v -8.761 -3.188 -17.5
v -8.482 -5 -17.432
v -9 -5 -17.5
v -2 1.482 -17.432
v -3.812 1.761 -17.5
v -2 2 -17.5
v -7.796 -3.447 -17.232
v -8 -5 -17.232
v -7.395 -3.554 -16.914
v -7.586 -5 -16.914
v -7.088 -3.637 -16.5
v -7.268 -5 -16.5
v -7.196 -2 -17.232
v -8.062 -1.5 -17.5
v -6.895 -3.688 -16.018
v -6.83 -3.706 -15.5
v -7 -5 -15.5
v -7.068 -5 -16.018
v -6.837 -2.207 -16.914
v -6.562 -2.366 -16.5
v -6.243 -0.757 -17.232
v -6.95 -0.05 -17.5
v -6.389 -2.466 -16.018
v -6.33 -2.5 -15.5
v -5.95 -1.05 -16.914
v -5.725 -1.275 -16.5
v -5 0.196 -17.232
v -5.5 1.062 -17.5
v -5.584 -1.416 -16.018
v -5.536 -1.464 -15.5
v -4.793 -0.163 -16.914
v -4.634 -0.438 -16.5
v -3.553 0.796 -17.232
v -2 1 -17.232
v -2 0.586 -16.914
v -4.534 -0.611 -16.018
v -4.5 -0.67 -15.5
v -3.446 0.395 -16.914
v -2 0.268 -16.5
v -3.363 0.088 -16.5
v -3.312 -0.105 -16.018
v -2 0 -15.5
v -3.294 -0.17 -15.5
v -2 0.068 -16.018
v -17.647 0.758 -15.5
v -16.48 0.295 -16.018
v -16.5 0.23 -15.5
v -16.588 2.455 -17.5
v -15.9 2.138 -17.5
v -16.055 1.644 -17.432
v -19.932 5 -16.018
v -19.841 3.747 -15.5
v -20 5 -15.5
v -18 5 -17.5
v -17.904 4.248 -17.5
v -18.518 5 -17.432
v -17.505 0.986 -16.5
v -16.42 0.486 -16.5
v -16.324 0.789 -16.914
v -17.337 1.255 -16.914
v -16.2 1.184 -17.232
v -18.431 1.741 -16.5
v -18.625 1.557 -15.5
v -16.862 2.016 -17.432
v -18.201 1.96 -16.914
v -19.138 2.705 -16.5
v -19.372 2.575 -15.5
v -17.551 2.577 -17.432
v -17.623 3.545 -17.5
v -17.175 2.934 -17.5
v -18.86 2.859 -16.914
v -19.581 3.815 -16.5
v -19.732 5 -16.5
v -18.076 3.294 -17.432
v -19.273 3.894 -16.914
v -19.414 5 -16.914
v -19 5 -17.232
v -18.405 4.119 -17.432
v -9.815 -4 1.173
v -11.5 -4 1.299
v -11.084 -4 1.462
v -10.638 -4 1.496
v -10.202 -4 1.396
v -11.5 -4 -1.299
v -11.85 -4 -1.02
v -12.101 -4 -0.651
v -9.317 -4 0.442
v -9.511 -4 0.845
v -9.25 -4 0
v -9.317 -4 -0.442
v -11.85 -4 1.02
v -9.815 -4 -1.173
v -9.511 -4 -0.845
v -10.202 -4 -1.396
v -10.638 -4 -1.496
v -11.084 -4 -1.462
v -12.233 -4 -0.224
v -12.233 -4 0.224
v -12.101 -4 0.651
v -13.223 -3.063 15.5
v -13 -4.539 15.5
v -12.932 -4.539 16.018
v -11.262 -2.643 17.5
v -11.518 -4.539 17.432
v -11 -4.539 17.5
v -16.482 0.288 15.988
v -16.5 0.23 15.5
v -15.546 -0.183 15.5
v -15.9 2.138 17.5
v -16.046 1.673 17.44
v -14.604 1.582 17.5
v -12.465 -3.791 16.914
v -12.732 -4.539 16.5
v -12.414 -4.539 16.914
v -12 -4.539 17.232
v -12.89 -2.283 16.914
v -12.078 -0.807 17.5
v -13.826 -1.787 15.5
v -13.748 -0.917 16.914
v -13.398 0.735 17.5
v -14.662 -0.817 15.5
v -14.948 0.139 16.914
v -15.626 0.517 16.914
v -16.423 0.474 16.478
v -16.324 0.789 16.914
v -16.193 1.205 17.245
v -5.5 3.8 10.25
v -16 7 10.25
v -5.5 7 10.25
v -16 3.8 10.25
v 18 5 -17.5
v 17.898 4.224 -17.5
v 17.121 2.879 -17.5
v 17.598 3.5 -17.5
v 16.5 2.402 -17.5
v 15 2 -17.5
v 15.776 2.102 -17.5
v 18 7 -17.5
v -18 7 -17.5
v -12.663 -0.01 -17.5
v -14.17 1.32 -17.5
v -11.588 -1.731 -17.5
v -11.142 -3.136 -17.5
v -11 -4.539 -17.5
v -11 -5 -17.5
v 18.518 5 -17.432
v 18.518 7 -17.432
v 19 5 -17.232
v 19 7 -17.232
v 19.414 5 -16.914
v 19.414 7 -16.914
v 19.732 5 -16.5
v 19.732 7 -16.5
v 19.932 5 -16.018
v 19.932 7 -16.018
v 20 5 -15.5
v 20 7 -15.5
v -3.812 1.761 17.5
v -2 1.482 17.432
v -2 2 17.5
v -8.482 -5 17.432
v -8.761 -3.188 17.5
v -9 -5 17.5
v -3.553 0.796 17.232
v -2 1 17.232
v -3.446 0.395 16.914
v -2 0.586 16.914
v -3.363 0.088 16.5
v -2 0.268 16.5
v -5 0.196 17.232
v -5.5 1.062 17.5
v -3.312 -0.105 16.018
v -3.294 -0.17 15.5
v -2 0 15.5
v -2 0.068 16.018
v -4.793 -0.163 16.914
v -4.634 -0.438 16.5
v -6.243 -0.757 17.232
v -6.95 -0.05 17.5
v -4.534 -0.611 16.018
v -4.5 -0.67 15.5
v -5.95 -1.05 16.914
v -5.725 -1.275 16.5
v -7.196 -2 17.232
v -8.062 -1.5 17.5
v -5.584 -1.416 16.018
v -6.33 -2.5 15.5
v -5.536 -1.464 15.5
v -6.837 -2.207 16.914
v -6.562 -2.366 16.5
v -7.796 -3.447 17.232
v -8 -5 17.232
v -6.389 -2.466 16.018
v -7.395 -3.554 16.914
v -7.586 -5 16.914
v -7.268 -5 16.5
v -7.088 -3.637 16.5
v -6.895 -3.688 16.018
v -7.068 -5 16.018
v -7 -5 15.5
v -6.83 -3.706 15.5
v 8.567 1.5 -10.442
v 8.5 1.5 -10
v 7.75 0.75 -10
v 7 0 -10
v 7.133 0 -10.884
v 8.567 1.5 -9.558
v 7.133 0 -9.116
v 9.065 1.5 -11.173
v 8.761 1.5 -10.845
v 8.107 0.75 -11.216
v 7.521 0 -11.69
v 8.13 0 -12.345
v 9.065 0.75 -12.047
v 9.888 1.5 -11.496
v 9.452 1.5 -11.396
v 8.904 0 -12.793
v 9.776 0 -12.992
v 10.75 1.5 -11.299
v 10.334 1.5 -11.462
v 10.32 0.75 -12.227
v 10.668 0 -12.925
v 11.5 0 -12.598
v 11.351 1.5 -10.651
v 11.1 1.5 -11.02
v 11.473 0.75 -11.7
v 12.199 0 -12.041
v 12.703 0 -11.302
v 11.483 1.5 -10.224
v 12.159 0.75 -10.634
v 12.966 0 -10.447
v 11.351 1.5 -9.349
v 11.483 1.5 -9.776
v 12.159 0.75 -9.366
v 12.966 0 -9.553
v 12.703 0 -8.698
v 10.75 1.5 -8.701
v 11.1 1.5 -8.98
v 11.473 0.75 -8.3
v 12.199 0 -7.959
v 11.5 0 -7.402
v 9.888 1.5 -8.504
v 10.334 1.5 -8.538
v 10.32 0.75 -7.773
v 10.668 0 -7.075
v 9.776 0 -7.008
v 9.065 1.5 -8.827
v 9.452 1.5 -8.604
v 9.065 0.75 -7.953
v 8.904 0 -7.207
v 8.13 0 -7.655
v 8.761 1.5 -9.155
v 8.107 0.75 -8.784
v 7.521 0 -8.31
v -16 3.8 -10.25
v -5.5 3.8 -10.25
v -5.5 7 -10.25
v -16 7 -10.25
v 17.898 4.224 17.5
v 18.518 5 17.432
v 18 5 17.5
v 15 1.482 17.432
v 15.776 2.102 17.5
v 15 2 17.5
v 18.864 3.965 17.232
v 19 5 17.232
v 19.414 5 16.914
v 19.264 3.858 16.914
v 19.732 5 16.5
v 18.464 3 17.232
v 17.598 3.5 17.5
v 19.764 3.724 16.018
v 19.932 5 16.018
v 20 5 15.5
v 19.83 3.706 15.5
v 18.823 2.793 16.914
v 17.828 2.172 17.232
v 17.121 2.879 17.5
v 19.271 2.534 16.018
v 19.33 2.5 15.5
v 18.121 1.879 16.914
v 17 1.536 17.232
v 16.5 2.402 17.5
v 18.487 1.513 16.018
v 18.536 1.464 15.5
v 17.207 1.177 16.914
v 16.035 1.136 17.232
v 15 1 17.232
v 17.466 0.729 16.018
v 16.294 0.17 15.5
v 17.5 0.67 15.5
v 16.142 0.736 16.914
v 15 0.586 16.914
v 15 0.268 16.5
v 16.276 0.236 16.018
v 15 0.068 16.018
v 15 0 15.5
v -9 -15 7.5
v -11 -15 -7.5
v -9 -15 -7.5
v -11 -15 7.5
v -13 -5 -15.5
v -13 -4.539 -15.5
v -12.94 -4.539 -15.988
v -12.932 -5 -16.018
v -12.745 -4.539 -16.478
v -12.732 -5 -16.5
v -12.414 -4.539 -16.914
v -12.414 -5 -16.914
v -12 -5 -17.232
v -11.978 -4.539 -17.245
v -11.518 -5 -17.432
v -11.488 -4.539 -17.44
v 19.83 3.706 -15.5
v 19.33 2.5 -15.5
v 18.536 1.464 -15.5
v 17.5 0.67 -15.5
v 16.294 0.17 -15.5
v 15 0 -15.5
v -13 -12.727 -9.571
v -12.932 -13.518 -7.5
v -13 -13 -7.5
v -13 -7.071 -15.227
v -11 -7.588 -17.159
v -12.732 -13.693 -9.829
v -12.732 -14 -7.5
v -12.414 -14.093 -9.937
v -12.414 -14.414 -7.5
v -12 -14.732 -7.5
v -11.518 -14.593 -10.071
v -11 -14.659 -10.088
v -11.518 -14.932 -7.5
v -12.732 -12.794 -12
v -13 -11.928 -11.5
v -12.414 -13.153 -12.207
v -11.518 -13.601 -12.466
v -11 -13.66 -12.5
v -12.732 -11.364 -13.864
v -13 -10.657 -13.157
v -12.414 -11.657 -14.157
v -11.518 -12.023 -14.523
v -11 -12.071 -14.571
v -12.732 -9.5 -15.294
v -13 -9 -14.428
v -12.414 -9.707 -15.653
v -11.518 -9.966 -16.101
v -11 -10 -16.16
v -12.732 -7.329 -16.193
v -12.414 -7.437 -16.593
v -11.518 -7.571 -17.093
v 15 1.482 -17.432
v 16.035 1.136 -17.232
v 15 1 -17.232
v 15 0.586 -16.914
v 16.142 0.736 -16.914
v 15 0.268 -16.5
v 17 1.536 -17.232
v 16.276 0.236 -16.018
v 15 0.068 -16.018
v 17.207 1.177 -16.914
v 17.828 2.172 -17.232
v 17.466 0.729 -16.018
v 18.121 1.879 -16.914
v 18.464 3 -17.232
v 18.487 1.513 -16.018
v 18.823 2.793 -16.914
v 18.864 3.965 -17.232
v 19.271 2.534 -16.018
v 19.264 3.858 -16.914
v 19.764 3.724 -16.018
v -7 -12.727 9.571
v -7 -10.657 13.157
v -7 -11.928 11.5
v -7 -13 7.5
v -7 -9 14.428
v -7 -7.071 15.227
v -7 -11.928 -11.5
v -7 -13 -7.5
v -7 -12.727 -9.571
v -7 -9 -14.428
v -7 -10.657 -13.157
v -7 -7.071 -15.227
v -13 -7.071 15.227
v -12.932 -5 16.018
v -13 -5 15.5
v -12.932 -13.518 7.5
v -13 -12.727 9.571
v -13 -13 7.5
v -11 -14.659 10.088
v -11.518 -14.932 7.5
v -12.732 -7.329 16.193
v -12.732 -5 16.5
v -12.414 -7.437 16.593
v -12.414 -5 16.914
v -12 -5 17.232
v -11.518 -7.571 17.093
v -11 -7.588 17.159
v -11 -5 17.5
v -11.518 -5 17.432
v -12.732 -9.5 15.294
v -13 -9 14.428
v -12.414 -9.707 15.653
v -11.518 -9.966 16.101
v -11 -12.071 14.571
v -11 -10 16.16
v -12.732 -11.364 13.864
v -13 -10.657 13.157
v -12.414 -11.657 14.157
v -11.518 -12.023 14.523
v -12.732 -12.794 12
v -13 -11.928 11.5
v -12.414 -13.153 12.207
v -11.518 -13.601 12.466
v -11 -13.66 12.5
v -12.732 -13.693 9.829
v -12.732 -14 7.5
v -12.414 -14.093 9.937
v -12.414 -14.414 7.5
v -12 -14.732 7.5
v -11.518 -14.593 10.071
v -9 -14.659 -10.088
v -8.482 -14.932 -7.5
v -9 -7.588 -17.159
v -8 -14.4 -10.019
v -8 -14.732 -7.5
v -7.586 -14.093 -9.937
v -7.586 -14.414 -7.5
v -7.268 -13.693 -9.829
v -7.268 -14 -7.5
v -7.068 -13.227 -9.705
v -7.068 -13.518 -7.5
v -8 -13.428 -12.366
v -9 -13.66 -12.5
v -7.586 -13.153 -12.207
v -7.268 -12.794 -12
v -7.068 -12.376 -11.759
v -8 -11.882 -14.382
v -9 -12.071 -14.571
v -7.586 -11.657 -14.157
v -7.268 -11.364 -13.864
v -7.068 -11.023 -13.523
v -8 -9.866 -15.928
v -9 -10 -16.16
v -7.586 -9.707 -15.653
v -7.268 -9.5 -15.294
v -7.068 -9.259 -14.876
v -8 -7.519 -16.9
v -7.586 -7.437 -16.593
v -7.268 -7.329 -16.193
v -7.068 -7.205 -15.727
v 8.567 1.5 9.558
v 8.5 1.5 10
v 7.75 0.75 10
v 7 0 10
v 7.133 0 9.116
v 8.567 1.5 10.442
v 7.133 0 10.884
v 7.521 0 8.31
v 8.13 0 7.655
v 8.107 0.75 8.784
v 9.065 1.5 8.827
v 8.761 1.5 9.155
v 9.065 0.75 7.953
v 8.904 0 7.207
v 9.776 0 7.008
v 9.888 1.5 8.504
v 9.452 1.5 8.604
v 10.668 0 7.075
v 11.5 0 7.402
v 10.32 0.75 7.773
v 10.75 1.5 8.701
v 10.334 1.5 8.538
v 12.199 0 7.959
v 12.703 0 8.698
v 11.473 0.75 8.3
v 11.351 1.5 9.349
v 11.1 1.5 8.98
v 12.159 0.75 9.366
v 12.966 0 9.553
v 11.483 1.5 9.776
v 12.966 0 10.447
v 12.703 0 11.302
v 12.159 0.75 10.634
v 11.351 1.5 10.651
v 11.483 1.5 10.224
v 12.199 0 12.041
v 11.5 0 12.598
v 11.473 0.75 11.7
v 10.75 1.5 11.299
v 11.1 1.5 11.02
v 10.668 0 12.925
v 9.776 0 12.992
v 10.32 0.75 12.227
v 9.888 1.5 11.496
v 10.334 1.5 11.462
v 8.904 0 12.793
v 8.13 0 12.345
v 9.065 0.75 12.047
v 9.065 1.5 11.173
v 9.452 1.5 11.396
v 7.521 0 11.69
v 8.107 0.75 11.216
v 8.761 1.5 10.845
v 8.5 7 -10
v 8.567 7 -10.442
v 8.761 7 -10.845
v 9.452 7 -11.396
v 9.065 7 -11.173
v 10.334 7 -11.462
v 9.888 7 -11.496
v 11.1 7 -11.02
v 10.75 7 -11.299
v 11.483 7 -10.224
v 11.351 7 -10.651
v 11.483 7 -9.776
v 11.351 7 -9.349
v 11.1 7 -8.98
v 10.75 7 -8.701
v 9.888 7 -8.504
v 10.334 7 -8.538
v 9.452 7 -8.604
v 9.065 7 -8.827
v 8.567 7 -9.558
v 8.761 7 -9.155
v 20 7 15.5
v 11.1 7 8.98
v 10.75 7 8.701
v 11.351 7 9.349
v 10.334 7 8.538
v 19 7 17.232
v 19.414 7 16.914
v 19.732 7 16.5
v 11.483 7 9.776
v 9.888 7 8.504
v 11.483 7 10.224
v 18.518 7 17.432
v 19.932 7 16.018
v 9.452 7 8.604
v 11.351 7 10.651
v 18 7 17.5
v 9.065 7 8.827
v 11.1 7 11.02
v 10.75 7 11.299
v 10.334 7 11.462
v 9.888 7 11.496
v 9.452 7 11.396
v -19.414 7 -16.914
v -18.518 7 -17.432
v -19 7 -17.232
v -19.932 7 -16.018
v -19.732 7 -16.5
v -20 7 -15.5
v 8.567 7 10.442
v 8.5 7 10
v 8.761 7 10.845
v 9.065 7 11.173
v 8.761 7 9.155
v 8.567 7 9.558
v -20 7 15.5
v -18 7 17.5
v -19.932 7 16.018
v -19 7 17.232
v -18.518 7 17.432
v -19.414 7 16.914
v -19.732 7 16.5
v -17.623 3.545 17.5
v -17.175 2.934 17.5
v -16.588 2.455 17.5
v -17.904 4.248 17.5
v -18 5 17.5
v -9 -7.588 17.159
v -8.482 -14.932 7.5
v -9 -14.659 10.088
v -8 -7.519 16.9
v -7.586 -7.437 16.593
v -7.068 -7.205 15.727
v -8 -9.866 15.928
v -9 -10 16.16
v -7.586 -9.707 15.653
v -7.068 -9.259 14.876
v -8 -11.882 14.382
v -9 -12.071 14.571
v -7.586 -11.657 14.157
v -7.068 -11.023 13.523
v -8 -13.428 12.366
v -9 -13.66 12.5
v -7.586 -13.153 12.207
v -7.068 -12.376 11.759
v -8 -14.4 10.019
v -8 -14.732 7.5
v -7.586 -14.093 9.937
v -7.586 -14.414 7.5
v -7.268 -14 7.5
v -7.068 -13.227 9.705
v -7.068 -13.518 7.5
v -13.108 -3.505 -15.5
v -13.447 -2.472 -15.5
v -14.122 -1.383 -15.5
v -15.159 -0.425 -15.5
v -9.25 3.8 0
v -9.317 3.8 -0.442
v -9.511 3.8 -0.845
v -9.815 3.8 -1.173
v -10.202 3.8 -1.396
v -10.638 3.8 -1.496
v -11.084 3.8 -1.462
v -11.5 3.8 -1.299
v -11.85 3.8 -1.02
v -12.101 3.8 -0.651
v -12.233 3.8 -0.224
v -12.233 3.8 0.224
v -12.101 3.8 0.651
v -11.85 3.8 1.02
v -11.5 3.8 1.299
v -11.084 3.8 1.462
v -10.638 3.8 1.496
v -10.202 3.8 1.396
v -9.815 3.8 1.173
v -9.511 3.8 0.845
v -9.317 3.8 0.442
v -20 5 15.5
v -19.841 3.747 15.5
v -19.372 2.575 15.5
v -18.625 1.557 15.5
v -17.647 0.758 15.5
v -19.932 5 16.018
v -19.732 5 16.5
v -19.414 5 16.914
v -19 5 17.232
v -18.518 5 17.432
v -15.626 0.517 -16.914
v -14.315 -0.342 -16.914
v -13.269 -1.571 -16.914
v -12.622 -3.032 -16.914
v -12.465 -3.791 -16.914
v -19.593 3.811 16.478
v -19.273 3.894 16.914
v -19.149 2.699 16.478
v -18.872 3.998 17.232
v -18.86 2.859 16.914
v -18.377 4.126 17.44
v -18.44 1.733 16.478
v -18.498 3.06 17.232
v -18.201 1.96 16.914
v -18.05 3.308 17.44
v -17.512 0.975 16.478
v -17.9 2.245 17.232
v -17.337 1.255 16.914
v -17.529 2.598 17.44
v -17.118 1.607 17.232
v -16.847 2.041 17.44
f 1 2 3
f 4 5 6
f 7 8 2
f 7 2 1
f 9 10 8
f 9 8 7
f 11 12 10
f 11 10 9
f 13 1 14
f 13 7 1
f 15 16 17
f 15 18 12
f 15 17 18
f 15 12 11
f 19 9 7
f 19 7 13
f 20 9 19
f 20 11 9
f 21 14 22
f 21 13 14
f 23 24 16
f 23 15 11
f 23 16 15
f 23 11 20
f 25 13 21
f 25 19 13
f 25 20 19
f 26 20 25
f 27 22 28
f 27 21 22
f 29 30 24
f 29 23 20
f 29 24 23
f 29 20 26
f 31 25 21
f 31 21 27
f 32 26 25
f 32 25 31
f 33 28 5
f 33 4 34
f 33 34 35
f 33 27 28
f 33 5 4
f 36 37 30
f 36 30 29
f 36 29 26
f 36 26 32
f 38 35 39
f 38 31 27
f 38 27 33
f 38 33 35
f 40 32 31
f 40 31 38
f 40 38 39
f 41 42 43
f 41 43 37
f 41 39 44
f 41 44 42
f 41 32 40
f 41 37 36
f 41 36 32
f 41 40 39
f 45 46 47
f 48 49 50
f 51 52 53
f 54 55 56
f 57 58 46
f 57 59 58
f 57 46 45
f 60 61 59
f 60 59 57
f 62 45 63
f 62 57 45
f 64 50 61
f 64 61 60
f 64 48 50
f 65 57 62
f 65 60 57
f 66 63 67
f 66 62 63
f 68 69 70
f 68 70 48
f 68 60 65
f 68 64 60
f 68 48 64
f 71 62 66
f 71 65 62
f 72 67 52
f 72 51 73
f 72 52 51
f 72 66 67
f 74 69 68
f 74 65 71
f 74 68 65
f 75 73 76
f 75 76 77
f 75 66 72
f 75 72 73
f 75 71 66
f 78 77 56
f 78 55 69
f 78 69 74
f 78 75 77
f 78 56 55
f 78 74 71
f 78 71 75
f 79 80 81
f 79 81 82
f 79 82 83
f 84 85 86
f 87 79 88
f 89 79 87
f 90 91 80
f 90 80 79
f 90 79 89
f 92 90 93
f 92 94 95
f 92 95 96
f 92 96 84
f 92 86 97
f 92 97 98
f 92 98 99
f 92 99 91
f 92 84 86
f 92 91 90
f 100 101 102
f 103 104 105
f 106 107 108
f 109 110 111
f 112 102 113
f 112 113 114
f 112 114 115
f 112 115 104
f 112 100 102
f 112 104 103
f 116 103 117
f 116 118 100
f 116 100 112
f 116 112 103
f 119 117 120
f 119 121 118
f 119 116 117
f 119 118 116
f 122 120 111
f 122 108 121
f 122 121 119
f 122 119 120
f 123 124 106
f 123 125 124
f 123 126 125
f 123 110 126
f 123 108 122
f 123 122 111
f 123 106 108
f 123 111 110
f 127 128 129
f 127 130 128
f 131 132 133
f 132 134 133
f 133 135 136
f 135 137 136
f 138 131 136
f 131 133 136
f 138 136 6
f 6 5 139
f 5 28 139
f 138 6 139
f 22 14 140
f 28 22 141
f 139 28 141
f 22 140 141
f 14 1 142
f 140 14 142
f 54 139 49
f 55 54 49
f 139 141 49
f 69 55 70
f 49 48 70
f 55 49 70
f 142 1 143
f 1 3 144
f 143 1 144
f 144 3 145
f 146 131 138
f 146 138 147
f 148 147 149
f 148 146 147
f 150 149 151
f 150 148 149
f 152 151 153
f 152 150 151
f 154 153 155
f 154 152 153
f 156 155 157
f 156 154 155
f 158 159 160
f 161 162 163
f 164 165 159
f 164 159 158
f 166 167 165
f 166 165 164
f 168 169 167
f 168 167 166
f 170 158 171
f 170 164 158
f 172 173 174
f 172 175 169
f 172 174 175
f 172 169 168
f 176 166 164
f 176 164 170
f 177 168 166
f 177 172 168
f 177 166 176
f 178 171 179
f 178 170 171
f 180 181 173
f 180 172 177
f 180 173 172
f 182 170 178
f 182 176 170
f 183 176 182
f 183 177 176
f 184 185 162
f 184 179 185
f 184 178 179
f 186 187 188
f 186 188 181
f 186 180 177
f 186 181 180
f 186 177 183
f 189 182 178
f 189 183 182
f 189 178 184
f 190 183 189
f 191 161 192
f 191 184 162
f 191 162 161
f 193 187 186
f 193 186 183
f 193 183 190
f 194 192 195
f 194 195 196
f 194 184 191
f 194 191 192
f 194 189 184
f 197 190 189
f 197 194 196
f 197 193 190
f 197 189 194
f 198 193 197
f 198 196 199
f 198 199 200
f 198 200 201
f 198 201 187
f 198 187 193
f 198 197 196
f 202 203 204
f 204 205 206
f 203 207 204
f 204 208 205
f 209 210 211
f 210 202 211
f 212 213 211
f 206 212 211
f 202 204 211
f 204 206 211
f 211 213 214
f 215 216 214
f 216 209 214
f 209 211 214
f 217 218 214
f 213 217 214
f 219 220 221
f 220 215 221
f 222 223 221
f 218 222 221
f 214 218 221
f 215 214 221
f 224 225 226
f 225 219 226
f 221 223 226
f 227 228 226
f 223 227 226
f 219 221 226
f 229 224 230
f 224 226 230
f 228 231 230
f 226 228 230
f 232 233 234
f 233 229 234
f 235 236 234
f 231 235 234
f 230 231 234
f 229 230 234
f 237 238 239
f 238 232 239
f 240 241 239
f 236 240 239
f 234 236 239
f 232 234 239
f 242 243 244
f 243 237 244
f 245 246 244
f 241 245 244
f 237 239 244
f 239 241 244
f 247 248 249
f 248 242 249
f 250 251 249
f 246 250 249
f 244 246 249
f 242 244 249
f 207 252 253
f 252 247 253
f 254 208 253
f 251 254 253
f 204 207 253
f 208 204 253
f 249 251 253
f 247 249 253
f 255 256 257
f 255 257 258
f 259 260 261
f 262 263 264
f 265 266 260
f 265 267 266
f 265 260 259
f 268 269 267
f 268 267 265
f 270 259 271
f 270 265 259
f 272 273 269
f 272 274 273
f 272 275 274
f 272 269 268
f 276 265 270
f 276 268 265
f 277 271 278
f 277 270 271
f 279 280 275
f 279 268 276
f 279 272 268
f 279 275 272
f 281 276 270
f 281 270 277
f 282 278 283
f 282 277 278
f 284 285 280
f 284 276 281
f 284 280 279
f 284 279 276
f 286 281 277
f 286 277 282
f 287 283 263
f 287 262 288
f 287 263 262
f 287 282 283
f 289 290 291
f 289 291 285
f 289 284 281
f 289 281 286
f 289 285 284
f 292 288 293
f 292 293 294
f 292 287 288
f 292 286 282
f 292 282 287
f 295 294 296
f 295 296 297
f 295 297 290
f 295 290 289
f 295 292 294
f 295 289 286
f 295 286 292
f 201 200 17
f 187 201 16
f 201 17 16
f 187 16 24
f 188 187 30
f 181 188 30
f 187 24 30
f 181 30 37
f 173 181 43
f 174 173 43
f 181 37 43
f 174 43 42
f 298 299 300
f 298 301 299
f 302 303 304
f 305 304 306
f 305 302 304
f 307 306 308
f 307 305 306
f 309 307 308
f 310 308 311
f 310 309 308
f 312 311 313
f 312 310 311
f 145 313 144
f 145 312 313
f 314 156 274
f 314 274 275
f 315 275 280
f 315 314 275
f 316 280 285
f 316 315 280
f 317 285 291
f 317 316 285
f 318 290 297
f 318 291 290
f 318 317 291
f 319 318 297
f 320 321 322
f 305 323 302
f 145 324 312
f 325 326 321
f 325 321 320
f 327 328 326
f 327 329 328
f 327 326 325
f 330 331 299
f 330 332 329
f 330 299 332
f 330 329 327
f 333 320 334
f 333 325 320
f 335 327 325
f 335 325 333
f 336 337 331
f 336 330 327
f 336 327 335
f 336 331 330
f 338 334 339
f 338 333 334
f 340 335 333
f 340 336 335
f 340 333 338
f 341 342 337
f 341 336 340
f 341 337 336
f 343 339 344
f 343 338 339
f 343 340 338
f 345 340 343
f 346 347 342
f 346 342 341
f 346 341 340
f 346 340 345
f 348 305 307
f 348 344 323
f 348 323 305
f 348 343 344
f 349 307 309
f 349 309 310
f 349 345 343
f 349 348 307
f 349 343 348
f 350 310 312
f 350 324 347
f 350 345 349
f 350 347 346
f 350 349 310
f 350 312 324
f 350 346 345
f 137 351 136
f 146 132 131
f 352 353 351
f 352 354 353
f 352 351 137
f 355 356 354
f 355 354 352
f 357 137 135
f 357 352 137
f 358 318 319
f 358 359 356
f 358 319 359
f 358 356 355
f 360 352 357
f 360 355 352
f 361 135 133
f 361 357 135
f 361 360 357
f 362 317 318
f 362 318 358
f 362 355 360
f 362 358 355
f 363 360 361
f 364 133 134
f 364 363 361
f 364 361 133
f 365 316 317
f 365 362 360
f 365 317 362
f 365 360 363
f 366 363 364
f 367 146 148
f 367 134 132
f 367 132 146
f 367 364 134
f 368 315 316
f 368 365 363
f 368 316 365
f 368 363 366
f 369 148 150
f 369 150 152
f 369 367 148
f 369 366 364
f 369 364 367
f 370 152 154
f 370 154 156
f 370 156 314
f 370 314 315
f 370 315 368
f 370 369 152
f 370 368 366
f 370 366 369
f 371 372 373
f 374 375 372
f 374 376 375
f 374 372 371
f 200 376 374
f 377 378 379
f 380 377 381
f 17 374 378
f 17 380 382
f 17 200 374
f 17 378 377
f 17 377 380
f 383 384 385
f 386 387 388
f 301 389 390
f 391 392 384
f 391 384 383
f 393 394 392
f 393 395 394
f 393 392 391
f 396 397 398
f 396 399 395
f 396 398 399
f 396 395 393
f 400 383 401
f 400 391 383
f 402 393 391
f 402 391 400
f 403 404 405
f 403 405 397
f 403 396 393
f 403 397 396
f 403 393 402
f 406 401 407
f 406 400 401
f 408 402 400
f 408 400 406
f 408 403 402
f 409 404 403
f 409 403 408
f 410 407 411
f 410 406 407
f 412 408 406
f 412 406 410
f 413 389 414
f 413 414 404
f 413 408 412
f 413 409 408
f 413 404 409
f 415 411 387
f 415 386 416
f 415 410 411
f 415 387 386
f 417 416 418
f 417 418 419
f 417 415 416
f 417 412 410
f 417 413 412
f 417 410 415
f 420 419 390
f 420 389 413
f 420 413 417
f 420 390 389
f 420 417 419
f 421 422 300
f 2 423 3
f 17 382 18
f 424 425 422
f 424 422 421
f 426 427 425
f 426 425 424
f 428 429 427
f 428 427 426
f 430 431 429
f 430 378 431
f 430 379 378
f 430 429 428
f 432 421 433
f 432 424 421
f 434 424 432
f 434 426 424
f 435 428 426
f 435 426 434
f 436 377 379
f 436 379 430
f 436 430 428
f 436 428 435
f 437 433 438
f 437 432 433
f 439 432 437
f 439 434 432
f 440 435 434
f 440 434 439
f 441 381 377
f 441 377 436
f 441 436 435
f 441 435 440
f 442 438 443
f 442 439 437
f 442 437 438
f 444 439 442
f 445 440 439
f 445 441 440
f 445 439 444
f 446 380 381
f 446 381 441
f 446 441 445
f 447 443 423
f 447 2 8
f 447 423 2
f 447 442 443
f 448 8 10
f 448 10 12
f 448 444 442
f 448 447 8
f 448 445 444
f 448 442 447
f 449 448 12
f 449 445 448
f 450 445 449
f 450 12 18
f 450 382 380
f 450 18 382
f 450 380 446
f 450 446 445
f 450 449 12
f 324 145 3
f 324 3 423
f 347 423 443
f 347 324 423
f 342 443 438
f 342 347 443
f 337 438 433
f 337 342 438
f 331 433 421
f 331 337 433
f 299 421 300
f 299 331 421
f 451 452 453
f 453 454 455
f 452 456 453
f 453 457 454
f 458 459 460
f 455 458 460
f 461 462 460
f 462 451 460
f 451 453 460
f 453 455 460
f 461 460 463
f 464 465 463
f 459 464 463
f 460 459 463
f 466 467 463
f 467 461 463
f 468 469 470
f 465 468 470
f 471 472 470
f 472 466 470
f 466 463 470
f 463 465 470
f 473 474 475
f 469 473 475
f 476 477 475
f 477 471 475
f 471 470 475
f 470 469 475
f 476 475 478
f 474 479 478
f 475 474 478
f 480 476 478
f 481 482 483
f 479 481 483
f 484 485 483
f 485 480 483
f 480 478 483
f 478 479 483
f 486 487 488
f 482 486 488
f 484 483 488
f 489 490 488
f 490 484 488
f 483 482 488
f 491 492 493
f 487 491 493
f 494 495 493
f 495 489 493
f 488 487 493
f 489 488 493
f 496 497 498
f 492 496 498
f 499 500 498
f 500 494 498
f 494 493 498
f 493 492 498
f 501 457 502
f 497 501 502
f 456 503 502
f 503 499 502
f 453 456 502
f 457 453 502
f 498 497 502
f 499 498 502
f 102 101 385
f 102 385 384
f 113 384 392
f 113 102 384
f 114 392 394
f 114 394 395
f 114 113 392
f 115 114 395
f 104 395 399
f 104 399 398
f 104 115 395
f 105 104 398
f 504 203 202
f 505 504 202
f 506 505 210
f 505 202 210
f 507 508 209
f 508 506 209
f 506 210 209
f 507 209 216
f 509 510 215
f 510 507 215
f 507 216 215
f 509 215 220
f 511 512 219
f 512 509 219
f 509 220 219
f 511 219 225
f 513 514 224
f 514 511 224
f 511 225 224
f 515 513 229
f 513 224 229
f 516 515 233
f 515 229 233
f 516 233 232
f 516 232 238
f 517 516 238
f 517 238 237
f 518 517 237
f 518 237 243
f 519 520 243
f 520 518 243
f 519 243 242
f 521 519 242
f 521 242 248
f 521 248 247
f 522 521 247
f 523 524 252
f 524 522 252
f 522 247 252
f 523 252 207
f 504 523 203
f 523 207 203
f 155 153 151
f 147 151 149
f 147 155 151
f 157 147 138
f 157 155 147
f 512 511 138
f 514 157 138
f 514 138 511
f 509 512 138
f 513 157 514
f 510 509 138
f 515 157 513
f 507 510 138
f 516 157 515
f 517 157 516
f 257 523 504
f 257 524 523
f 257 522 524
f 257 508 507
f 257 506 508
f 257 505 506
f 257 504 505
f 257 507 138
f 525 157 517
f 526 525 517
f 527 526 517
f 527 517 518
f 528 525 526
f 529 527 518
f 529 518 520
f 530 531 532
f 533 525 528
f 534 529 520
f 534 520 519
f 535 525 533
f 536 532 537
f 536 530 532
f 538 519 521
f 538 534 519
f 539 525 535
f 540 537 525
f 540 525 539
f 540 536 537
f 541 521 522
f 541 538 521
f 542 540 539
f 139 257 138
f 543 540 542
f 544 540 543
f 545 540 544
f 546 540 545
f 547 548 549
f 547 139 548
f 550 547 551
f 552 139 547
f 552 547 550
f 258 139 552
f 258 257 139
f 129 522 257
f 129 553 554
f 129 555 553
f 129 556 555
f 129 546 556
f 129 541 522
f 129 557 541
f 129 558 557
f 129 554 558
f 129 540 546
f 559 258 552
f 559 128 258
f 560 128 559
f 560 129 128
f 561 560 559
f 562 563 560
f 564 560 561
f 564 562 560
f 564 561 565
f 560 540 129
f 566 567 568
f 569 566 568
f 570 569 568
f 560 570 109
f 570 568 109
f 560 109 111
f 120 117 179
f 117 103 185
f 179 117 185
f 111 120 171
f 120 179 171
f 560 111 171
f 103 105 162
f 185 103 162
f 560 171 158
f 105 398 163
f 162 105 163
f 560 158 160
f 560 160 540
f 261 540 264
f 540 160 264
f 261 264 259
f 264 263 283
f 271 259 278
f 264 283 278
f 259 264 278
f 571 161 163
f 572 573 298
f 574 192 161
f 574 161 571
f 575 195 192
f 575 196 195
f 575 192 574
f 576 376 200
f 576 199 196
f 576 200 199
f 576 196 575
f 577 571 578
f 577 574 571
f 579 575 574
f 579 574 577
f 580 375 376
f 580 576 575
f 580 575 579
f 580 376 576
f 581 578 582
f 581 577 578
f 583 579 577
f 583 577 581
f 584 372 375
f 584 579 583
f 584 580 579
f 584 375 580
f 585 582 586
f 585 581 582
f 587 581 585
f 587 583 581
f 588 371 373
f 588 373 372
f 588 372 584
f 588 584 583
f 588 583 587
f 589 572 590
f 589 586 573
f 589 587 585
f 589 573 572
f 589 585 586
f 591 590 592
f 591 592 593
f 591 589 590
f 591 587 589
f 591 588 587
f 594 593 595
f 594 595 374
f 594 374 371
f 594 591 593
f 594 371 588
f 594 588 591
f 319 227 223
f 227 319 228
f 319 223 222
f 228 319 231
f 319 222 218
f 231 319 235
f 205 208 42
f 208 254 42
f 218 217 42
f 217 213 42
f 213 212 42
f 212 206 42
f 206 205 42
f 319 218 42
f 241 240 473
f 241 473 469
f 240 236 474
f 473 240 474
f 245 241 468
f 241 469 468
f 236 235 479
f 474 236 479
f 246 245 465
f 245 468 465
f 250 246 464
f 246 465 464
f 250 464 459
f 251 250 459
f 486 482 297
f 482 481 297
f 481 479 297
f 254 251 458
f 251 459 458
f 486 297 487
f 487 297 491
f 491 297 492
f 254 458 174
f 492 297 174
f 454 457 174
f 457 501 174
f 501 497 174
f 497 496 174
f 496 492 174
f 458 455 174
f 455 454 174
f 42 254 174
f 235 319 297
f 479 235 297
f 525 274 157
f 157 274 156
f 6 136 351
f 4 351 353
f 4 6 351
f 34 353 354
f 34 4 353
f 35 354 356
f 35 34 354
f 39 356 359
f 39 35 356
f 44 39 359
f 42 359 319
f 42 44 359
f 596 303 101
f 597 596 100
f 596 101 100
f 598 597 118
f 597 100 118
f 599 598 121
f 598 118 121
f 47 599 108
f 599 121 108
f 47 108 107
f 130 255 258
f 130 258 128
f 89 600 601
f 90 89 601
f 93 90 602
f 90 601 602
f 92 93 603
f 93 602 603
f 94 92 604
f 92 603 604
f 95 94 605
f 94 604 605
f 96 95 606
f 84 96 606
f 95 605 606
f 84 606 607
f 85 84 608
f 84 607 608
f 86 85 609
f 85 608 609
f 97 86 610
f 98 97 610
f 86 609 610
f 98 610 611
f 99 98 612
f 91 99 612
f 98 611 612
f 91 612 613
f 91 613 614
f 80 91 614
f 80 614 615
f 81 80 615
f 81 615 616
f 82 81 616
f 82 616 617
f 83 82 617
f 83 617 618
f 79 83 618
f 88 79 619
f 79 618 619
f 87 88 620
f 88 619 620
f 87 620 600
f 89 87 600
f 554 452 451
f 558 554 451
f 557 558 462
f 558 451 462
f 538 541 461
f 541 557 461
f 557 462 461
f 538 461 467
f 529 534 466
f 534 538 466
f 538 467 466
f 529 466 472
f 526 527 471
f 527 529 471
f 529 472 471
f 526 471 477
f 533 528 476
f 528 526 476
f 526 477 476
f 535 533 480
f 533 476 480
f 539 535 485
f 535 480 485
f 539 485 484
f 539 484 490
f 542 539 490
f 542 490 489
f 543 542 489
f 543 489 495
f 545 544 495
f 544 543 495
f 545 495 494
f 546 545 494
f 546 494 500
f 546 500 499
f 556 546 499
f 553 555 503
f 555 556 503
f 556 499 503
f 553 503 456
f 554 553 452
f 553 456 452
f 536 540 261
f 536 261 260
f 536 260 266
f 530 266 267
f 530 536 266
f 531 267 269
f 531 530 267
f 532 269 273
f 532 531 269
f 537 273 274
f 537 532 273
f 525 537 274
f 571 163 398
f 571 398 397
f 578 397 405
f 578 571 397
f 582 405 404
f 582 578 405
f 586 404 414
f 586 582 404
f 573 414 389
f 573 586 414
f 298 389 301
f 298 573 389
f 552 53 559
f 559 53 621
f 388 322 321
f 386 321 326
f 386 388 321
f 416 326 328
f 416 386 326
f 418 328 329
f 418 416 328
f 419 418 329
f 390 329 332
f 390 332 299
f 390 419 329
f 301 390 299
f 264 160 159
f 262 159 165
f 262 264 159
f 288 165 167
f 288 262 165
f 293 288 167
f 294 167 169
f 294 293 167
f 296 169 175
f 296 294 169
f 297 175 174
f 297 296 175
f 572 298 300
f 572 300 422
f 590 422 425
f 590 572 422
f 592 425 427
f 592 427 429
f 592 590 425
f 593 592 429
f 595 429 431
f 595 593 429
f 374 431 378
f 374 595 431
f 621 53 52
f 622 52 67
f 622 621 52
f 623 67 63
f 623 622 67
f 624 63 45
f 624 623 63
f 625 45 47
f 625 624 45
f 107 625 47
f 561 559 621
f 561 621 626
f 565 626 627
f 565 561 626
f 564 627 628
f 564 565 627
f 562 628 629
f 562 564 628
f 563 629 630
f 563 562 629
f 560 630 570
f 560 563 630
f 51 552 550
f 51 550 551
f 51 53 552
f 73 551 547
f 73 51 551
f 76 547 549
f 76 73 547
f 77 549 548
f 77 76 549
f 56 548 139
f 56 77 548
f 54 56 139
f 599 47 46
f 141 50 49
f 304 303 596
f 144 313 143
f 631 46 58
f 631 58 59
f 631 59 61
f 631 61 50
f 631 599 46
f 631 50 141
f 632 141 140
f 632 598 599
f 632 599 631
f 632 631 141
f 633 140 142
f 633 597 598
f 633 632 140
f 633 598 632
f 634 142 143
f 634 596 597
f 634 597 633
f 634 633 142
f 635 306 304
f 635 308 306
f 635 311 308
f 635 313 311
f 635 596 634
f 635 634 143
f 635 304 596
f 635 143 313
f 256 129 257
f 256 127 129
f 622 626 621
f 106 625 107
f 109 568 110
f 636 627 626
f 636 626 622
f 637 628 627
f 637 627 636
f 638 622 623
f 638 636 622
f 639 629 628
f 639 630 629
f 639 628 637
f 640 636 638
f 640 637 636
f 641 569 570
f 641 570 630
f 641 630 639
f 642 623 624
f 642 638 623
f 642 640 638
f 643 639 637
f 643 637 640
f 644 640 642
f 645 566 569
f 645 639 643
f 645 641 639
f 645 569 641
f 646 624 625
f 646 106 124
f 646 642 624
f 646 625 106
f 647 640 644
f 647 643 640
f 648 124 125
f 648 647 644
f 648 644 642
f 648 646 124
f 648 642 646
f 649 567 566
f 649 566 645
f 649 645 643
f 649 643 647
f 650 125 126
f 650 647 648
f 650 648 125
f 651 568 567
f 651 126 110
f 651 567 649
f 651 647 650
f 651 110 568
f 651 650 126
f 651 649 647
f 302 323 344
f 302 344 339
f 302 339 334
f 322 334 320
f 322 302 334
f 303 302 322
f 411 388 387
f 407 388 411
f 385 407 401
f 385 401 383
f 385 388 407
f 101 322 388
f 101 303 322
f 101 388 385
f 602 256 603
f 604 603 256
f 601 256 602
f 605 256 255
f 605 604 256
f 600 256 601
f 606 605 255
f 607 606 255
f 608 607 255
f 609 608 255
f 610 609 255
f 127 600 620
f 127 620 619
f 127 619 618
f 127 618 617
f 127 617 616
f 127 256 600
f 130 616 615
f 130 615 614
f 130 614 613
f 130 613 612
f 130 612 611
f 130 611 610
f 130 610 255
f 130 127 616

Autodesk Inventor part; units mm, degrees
ref_plane "YZ Plane" through (0, 0, 0) normal (1, 0, 0) x (0, 1, 0)
ref_plane "XZ Plane" through (0, 0, 0) normal (0, 1, 0) x (-1, 0, 0)
ref_plane "XY Plane" through (0, 0, 0) normal (0, 0, 1) x (1, 0, 0)
sketch "Эскиз1" plane through (0, 0, 0) normal (0, 1, 0) x (-1, 0, 0)
  line L0 (-20, -17.5) -> (20, -17.5)
  line L1 (20, -17.5) -> (20, 17.5)
  line L2 (20, 17.5) -> (-20, 17.5)
  line L3 (-20, 17.5) -> (-20, -17.5)
  line L4 (-20, -17.5) -> (20, 17.5) construction
  line L5 (20, -17.5) -> (-20, 17.5) construction
  line L6 (-10, 17.5) -> (-10, -17.5) construction
  circle A0 centre (-10, 10) radius 1.5
  circle A1 centre (-10, -10) radius 1.5
  line L7 (0, 0) -> (-17.0059, 0) construction
  line L8 (5.5, -10.25) -> (16, -10.25)
  line L9 (16, -10.25) -> (16, 10.25)
  line L10 (16, 10.25) -> (5.5, 10.25)
  line L11 (5.5, 10.25) -> (5.5, -10.25)
  line L12 (5.5, -10.25) -> (16, 10.25) construction
  line L13 (16, -10.25) -> (5.5, 10.25) construction
  circle A2 centre (10.75, 0) radius 1.5
  point P0 (10.75, 0)
  point P1 (10.75, 0)
  dimension "d0" = 3
  dimension "d1" = 3
  dimension "d2" = 20
  dimension "d3" = 10
  dimension "d4" = 35
  dimension "d5" = 10.5
  dimension "d6" = 20.5
  dimension "d14" = 3
  dimension "d17" = 4
  dimension "d18" = 20
extrude "Выдавливание1" add sketch "Эскиз1" along normal blind 7 contours L3 L2 L1 L0
extrude "Выдавливание2" add sketch "Эскиз1" along normal blind 3.8 contours L11 L10 L9 L8 | A2
chamfer "Фаска1" distance 1.5 angle 45 2 edges at (11.5, 0, -10) (11.5, 0, 10)
extrude "Выдавливание3" add sketch "Эскиз1" along normal blind 6 contours A2
fillet "Сопряжение1" radius 5 1 edges at (20, 0, 0)
fillet "Сопряжение2" radius 5 1 edges at (-20, 0, 0)
sketch "Эскиз3" plane through (0, 0, 0) normal (0, -1, 0) x (1, 0, 0)
  line L0 (-15, 17.5) -> (15, 17.5) projected
  line L1 (-7, -17.5) -> (-13, -17.5)
  line L2 (-13, -17.5) -> (-13, 17.5)
  line L3 (-13, 17.5) -> (-7, 17.5)
  line L4 (-7, 17.5) -> (-7, -17.5)
  line L5 (-7, -17.5) -> (-13, 17.5) construction
  line L6 (-13, -17.5) -> (-7, 17.5) construction
  point P0 (0, 0)
  point P1 (-10, 0)
  dimension "d27" = 6
  dimension "d28" = 10
extrude "Выдавливание5" add sketch "Эскиз3" along normal blind 15
fillet "Сопряжение4" radius 10 2 edges at (-10, -15, 17.5) (-10, -15, -17.5)
fillet "Сопряжение5" radius 5 2 edges at (-13, 0, 0) (-7, 0, 0)
fillet "Сопряжение6" radius 2 22 edges at (-13, -15, 0) (-13, -12.0711, -14.5711) (-13, -4.7697, -17.5) (-13.9689, -1.5814, -17.5) (-19.0311, 2.042, -17.5) (-20, 6, -17.5) (-13, -4.7697, 17.5) (-13.9689, -1.5814, 17.5) (-19.0311, 2.042, 17.5) (-20, 6, 17.5) (-13, -12.0711, 14.5711) (-5.5355, -1.4645, 17.5) (6.5, 0, 17.5) (18.5355, 1.4645, 17.5) (20, 6, 17.5) (-7, -15, 0) (-7, -12.0711, -14.5711) (-5.5355, -1.4645, -17.5) (6.5, 0, -17.5) (18.5355, 1.4645, -17.5) (20, 6, -17.5) (-7, -12.0711, 14.5711)
sketch "Эскиз4" plane through (-10.75, 6, 0) normal (0, 1, 0) x (1, 0, 0)
  circle A0 centre (0, 0) radius 1.5 projected
  point P0 (10.75, 0)
extrude "Выдавливание6" cut sketch "Эскиз4" against normal blind 10
properties part number "магнитный  держатель"
